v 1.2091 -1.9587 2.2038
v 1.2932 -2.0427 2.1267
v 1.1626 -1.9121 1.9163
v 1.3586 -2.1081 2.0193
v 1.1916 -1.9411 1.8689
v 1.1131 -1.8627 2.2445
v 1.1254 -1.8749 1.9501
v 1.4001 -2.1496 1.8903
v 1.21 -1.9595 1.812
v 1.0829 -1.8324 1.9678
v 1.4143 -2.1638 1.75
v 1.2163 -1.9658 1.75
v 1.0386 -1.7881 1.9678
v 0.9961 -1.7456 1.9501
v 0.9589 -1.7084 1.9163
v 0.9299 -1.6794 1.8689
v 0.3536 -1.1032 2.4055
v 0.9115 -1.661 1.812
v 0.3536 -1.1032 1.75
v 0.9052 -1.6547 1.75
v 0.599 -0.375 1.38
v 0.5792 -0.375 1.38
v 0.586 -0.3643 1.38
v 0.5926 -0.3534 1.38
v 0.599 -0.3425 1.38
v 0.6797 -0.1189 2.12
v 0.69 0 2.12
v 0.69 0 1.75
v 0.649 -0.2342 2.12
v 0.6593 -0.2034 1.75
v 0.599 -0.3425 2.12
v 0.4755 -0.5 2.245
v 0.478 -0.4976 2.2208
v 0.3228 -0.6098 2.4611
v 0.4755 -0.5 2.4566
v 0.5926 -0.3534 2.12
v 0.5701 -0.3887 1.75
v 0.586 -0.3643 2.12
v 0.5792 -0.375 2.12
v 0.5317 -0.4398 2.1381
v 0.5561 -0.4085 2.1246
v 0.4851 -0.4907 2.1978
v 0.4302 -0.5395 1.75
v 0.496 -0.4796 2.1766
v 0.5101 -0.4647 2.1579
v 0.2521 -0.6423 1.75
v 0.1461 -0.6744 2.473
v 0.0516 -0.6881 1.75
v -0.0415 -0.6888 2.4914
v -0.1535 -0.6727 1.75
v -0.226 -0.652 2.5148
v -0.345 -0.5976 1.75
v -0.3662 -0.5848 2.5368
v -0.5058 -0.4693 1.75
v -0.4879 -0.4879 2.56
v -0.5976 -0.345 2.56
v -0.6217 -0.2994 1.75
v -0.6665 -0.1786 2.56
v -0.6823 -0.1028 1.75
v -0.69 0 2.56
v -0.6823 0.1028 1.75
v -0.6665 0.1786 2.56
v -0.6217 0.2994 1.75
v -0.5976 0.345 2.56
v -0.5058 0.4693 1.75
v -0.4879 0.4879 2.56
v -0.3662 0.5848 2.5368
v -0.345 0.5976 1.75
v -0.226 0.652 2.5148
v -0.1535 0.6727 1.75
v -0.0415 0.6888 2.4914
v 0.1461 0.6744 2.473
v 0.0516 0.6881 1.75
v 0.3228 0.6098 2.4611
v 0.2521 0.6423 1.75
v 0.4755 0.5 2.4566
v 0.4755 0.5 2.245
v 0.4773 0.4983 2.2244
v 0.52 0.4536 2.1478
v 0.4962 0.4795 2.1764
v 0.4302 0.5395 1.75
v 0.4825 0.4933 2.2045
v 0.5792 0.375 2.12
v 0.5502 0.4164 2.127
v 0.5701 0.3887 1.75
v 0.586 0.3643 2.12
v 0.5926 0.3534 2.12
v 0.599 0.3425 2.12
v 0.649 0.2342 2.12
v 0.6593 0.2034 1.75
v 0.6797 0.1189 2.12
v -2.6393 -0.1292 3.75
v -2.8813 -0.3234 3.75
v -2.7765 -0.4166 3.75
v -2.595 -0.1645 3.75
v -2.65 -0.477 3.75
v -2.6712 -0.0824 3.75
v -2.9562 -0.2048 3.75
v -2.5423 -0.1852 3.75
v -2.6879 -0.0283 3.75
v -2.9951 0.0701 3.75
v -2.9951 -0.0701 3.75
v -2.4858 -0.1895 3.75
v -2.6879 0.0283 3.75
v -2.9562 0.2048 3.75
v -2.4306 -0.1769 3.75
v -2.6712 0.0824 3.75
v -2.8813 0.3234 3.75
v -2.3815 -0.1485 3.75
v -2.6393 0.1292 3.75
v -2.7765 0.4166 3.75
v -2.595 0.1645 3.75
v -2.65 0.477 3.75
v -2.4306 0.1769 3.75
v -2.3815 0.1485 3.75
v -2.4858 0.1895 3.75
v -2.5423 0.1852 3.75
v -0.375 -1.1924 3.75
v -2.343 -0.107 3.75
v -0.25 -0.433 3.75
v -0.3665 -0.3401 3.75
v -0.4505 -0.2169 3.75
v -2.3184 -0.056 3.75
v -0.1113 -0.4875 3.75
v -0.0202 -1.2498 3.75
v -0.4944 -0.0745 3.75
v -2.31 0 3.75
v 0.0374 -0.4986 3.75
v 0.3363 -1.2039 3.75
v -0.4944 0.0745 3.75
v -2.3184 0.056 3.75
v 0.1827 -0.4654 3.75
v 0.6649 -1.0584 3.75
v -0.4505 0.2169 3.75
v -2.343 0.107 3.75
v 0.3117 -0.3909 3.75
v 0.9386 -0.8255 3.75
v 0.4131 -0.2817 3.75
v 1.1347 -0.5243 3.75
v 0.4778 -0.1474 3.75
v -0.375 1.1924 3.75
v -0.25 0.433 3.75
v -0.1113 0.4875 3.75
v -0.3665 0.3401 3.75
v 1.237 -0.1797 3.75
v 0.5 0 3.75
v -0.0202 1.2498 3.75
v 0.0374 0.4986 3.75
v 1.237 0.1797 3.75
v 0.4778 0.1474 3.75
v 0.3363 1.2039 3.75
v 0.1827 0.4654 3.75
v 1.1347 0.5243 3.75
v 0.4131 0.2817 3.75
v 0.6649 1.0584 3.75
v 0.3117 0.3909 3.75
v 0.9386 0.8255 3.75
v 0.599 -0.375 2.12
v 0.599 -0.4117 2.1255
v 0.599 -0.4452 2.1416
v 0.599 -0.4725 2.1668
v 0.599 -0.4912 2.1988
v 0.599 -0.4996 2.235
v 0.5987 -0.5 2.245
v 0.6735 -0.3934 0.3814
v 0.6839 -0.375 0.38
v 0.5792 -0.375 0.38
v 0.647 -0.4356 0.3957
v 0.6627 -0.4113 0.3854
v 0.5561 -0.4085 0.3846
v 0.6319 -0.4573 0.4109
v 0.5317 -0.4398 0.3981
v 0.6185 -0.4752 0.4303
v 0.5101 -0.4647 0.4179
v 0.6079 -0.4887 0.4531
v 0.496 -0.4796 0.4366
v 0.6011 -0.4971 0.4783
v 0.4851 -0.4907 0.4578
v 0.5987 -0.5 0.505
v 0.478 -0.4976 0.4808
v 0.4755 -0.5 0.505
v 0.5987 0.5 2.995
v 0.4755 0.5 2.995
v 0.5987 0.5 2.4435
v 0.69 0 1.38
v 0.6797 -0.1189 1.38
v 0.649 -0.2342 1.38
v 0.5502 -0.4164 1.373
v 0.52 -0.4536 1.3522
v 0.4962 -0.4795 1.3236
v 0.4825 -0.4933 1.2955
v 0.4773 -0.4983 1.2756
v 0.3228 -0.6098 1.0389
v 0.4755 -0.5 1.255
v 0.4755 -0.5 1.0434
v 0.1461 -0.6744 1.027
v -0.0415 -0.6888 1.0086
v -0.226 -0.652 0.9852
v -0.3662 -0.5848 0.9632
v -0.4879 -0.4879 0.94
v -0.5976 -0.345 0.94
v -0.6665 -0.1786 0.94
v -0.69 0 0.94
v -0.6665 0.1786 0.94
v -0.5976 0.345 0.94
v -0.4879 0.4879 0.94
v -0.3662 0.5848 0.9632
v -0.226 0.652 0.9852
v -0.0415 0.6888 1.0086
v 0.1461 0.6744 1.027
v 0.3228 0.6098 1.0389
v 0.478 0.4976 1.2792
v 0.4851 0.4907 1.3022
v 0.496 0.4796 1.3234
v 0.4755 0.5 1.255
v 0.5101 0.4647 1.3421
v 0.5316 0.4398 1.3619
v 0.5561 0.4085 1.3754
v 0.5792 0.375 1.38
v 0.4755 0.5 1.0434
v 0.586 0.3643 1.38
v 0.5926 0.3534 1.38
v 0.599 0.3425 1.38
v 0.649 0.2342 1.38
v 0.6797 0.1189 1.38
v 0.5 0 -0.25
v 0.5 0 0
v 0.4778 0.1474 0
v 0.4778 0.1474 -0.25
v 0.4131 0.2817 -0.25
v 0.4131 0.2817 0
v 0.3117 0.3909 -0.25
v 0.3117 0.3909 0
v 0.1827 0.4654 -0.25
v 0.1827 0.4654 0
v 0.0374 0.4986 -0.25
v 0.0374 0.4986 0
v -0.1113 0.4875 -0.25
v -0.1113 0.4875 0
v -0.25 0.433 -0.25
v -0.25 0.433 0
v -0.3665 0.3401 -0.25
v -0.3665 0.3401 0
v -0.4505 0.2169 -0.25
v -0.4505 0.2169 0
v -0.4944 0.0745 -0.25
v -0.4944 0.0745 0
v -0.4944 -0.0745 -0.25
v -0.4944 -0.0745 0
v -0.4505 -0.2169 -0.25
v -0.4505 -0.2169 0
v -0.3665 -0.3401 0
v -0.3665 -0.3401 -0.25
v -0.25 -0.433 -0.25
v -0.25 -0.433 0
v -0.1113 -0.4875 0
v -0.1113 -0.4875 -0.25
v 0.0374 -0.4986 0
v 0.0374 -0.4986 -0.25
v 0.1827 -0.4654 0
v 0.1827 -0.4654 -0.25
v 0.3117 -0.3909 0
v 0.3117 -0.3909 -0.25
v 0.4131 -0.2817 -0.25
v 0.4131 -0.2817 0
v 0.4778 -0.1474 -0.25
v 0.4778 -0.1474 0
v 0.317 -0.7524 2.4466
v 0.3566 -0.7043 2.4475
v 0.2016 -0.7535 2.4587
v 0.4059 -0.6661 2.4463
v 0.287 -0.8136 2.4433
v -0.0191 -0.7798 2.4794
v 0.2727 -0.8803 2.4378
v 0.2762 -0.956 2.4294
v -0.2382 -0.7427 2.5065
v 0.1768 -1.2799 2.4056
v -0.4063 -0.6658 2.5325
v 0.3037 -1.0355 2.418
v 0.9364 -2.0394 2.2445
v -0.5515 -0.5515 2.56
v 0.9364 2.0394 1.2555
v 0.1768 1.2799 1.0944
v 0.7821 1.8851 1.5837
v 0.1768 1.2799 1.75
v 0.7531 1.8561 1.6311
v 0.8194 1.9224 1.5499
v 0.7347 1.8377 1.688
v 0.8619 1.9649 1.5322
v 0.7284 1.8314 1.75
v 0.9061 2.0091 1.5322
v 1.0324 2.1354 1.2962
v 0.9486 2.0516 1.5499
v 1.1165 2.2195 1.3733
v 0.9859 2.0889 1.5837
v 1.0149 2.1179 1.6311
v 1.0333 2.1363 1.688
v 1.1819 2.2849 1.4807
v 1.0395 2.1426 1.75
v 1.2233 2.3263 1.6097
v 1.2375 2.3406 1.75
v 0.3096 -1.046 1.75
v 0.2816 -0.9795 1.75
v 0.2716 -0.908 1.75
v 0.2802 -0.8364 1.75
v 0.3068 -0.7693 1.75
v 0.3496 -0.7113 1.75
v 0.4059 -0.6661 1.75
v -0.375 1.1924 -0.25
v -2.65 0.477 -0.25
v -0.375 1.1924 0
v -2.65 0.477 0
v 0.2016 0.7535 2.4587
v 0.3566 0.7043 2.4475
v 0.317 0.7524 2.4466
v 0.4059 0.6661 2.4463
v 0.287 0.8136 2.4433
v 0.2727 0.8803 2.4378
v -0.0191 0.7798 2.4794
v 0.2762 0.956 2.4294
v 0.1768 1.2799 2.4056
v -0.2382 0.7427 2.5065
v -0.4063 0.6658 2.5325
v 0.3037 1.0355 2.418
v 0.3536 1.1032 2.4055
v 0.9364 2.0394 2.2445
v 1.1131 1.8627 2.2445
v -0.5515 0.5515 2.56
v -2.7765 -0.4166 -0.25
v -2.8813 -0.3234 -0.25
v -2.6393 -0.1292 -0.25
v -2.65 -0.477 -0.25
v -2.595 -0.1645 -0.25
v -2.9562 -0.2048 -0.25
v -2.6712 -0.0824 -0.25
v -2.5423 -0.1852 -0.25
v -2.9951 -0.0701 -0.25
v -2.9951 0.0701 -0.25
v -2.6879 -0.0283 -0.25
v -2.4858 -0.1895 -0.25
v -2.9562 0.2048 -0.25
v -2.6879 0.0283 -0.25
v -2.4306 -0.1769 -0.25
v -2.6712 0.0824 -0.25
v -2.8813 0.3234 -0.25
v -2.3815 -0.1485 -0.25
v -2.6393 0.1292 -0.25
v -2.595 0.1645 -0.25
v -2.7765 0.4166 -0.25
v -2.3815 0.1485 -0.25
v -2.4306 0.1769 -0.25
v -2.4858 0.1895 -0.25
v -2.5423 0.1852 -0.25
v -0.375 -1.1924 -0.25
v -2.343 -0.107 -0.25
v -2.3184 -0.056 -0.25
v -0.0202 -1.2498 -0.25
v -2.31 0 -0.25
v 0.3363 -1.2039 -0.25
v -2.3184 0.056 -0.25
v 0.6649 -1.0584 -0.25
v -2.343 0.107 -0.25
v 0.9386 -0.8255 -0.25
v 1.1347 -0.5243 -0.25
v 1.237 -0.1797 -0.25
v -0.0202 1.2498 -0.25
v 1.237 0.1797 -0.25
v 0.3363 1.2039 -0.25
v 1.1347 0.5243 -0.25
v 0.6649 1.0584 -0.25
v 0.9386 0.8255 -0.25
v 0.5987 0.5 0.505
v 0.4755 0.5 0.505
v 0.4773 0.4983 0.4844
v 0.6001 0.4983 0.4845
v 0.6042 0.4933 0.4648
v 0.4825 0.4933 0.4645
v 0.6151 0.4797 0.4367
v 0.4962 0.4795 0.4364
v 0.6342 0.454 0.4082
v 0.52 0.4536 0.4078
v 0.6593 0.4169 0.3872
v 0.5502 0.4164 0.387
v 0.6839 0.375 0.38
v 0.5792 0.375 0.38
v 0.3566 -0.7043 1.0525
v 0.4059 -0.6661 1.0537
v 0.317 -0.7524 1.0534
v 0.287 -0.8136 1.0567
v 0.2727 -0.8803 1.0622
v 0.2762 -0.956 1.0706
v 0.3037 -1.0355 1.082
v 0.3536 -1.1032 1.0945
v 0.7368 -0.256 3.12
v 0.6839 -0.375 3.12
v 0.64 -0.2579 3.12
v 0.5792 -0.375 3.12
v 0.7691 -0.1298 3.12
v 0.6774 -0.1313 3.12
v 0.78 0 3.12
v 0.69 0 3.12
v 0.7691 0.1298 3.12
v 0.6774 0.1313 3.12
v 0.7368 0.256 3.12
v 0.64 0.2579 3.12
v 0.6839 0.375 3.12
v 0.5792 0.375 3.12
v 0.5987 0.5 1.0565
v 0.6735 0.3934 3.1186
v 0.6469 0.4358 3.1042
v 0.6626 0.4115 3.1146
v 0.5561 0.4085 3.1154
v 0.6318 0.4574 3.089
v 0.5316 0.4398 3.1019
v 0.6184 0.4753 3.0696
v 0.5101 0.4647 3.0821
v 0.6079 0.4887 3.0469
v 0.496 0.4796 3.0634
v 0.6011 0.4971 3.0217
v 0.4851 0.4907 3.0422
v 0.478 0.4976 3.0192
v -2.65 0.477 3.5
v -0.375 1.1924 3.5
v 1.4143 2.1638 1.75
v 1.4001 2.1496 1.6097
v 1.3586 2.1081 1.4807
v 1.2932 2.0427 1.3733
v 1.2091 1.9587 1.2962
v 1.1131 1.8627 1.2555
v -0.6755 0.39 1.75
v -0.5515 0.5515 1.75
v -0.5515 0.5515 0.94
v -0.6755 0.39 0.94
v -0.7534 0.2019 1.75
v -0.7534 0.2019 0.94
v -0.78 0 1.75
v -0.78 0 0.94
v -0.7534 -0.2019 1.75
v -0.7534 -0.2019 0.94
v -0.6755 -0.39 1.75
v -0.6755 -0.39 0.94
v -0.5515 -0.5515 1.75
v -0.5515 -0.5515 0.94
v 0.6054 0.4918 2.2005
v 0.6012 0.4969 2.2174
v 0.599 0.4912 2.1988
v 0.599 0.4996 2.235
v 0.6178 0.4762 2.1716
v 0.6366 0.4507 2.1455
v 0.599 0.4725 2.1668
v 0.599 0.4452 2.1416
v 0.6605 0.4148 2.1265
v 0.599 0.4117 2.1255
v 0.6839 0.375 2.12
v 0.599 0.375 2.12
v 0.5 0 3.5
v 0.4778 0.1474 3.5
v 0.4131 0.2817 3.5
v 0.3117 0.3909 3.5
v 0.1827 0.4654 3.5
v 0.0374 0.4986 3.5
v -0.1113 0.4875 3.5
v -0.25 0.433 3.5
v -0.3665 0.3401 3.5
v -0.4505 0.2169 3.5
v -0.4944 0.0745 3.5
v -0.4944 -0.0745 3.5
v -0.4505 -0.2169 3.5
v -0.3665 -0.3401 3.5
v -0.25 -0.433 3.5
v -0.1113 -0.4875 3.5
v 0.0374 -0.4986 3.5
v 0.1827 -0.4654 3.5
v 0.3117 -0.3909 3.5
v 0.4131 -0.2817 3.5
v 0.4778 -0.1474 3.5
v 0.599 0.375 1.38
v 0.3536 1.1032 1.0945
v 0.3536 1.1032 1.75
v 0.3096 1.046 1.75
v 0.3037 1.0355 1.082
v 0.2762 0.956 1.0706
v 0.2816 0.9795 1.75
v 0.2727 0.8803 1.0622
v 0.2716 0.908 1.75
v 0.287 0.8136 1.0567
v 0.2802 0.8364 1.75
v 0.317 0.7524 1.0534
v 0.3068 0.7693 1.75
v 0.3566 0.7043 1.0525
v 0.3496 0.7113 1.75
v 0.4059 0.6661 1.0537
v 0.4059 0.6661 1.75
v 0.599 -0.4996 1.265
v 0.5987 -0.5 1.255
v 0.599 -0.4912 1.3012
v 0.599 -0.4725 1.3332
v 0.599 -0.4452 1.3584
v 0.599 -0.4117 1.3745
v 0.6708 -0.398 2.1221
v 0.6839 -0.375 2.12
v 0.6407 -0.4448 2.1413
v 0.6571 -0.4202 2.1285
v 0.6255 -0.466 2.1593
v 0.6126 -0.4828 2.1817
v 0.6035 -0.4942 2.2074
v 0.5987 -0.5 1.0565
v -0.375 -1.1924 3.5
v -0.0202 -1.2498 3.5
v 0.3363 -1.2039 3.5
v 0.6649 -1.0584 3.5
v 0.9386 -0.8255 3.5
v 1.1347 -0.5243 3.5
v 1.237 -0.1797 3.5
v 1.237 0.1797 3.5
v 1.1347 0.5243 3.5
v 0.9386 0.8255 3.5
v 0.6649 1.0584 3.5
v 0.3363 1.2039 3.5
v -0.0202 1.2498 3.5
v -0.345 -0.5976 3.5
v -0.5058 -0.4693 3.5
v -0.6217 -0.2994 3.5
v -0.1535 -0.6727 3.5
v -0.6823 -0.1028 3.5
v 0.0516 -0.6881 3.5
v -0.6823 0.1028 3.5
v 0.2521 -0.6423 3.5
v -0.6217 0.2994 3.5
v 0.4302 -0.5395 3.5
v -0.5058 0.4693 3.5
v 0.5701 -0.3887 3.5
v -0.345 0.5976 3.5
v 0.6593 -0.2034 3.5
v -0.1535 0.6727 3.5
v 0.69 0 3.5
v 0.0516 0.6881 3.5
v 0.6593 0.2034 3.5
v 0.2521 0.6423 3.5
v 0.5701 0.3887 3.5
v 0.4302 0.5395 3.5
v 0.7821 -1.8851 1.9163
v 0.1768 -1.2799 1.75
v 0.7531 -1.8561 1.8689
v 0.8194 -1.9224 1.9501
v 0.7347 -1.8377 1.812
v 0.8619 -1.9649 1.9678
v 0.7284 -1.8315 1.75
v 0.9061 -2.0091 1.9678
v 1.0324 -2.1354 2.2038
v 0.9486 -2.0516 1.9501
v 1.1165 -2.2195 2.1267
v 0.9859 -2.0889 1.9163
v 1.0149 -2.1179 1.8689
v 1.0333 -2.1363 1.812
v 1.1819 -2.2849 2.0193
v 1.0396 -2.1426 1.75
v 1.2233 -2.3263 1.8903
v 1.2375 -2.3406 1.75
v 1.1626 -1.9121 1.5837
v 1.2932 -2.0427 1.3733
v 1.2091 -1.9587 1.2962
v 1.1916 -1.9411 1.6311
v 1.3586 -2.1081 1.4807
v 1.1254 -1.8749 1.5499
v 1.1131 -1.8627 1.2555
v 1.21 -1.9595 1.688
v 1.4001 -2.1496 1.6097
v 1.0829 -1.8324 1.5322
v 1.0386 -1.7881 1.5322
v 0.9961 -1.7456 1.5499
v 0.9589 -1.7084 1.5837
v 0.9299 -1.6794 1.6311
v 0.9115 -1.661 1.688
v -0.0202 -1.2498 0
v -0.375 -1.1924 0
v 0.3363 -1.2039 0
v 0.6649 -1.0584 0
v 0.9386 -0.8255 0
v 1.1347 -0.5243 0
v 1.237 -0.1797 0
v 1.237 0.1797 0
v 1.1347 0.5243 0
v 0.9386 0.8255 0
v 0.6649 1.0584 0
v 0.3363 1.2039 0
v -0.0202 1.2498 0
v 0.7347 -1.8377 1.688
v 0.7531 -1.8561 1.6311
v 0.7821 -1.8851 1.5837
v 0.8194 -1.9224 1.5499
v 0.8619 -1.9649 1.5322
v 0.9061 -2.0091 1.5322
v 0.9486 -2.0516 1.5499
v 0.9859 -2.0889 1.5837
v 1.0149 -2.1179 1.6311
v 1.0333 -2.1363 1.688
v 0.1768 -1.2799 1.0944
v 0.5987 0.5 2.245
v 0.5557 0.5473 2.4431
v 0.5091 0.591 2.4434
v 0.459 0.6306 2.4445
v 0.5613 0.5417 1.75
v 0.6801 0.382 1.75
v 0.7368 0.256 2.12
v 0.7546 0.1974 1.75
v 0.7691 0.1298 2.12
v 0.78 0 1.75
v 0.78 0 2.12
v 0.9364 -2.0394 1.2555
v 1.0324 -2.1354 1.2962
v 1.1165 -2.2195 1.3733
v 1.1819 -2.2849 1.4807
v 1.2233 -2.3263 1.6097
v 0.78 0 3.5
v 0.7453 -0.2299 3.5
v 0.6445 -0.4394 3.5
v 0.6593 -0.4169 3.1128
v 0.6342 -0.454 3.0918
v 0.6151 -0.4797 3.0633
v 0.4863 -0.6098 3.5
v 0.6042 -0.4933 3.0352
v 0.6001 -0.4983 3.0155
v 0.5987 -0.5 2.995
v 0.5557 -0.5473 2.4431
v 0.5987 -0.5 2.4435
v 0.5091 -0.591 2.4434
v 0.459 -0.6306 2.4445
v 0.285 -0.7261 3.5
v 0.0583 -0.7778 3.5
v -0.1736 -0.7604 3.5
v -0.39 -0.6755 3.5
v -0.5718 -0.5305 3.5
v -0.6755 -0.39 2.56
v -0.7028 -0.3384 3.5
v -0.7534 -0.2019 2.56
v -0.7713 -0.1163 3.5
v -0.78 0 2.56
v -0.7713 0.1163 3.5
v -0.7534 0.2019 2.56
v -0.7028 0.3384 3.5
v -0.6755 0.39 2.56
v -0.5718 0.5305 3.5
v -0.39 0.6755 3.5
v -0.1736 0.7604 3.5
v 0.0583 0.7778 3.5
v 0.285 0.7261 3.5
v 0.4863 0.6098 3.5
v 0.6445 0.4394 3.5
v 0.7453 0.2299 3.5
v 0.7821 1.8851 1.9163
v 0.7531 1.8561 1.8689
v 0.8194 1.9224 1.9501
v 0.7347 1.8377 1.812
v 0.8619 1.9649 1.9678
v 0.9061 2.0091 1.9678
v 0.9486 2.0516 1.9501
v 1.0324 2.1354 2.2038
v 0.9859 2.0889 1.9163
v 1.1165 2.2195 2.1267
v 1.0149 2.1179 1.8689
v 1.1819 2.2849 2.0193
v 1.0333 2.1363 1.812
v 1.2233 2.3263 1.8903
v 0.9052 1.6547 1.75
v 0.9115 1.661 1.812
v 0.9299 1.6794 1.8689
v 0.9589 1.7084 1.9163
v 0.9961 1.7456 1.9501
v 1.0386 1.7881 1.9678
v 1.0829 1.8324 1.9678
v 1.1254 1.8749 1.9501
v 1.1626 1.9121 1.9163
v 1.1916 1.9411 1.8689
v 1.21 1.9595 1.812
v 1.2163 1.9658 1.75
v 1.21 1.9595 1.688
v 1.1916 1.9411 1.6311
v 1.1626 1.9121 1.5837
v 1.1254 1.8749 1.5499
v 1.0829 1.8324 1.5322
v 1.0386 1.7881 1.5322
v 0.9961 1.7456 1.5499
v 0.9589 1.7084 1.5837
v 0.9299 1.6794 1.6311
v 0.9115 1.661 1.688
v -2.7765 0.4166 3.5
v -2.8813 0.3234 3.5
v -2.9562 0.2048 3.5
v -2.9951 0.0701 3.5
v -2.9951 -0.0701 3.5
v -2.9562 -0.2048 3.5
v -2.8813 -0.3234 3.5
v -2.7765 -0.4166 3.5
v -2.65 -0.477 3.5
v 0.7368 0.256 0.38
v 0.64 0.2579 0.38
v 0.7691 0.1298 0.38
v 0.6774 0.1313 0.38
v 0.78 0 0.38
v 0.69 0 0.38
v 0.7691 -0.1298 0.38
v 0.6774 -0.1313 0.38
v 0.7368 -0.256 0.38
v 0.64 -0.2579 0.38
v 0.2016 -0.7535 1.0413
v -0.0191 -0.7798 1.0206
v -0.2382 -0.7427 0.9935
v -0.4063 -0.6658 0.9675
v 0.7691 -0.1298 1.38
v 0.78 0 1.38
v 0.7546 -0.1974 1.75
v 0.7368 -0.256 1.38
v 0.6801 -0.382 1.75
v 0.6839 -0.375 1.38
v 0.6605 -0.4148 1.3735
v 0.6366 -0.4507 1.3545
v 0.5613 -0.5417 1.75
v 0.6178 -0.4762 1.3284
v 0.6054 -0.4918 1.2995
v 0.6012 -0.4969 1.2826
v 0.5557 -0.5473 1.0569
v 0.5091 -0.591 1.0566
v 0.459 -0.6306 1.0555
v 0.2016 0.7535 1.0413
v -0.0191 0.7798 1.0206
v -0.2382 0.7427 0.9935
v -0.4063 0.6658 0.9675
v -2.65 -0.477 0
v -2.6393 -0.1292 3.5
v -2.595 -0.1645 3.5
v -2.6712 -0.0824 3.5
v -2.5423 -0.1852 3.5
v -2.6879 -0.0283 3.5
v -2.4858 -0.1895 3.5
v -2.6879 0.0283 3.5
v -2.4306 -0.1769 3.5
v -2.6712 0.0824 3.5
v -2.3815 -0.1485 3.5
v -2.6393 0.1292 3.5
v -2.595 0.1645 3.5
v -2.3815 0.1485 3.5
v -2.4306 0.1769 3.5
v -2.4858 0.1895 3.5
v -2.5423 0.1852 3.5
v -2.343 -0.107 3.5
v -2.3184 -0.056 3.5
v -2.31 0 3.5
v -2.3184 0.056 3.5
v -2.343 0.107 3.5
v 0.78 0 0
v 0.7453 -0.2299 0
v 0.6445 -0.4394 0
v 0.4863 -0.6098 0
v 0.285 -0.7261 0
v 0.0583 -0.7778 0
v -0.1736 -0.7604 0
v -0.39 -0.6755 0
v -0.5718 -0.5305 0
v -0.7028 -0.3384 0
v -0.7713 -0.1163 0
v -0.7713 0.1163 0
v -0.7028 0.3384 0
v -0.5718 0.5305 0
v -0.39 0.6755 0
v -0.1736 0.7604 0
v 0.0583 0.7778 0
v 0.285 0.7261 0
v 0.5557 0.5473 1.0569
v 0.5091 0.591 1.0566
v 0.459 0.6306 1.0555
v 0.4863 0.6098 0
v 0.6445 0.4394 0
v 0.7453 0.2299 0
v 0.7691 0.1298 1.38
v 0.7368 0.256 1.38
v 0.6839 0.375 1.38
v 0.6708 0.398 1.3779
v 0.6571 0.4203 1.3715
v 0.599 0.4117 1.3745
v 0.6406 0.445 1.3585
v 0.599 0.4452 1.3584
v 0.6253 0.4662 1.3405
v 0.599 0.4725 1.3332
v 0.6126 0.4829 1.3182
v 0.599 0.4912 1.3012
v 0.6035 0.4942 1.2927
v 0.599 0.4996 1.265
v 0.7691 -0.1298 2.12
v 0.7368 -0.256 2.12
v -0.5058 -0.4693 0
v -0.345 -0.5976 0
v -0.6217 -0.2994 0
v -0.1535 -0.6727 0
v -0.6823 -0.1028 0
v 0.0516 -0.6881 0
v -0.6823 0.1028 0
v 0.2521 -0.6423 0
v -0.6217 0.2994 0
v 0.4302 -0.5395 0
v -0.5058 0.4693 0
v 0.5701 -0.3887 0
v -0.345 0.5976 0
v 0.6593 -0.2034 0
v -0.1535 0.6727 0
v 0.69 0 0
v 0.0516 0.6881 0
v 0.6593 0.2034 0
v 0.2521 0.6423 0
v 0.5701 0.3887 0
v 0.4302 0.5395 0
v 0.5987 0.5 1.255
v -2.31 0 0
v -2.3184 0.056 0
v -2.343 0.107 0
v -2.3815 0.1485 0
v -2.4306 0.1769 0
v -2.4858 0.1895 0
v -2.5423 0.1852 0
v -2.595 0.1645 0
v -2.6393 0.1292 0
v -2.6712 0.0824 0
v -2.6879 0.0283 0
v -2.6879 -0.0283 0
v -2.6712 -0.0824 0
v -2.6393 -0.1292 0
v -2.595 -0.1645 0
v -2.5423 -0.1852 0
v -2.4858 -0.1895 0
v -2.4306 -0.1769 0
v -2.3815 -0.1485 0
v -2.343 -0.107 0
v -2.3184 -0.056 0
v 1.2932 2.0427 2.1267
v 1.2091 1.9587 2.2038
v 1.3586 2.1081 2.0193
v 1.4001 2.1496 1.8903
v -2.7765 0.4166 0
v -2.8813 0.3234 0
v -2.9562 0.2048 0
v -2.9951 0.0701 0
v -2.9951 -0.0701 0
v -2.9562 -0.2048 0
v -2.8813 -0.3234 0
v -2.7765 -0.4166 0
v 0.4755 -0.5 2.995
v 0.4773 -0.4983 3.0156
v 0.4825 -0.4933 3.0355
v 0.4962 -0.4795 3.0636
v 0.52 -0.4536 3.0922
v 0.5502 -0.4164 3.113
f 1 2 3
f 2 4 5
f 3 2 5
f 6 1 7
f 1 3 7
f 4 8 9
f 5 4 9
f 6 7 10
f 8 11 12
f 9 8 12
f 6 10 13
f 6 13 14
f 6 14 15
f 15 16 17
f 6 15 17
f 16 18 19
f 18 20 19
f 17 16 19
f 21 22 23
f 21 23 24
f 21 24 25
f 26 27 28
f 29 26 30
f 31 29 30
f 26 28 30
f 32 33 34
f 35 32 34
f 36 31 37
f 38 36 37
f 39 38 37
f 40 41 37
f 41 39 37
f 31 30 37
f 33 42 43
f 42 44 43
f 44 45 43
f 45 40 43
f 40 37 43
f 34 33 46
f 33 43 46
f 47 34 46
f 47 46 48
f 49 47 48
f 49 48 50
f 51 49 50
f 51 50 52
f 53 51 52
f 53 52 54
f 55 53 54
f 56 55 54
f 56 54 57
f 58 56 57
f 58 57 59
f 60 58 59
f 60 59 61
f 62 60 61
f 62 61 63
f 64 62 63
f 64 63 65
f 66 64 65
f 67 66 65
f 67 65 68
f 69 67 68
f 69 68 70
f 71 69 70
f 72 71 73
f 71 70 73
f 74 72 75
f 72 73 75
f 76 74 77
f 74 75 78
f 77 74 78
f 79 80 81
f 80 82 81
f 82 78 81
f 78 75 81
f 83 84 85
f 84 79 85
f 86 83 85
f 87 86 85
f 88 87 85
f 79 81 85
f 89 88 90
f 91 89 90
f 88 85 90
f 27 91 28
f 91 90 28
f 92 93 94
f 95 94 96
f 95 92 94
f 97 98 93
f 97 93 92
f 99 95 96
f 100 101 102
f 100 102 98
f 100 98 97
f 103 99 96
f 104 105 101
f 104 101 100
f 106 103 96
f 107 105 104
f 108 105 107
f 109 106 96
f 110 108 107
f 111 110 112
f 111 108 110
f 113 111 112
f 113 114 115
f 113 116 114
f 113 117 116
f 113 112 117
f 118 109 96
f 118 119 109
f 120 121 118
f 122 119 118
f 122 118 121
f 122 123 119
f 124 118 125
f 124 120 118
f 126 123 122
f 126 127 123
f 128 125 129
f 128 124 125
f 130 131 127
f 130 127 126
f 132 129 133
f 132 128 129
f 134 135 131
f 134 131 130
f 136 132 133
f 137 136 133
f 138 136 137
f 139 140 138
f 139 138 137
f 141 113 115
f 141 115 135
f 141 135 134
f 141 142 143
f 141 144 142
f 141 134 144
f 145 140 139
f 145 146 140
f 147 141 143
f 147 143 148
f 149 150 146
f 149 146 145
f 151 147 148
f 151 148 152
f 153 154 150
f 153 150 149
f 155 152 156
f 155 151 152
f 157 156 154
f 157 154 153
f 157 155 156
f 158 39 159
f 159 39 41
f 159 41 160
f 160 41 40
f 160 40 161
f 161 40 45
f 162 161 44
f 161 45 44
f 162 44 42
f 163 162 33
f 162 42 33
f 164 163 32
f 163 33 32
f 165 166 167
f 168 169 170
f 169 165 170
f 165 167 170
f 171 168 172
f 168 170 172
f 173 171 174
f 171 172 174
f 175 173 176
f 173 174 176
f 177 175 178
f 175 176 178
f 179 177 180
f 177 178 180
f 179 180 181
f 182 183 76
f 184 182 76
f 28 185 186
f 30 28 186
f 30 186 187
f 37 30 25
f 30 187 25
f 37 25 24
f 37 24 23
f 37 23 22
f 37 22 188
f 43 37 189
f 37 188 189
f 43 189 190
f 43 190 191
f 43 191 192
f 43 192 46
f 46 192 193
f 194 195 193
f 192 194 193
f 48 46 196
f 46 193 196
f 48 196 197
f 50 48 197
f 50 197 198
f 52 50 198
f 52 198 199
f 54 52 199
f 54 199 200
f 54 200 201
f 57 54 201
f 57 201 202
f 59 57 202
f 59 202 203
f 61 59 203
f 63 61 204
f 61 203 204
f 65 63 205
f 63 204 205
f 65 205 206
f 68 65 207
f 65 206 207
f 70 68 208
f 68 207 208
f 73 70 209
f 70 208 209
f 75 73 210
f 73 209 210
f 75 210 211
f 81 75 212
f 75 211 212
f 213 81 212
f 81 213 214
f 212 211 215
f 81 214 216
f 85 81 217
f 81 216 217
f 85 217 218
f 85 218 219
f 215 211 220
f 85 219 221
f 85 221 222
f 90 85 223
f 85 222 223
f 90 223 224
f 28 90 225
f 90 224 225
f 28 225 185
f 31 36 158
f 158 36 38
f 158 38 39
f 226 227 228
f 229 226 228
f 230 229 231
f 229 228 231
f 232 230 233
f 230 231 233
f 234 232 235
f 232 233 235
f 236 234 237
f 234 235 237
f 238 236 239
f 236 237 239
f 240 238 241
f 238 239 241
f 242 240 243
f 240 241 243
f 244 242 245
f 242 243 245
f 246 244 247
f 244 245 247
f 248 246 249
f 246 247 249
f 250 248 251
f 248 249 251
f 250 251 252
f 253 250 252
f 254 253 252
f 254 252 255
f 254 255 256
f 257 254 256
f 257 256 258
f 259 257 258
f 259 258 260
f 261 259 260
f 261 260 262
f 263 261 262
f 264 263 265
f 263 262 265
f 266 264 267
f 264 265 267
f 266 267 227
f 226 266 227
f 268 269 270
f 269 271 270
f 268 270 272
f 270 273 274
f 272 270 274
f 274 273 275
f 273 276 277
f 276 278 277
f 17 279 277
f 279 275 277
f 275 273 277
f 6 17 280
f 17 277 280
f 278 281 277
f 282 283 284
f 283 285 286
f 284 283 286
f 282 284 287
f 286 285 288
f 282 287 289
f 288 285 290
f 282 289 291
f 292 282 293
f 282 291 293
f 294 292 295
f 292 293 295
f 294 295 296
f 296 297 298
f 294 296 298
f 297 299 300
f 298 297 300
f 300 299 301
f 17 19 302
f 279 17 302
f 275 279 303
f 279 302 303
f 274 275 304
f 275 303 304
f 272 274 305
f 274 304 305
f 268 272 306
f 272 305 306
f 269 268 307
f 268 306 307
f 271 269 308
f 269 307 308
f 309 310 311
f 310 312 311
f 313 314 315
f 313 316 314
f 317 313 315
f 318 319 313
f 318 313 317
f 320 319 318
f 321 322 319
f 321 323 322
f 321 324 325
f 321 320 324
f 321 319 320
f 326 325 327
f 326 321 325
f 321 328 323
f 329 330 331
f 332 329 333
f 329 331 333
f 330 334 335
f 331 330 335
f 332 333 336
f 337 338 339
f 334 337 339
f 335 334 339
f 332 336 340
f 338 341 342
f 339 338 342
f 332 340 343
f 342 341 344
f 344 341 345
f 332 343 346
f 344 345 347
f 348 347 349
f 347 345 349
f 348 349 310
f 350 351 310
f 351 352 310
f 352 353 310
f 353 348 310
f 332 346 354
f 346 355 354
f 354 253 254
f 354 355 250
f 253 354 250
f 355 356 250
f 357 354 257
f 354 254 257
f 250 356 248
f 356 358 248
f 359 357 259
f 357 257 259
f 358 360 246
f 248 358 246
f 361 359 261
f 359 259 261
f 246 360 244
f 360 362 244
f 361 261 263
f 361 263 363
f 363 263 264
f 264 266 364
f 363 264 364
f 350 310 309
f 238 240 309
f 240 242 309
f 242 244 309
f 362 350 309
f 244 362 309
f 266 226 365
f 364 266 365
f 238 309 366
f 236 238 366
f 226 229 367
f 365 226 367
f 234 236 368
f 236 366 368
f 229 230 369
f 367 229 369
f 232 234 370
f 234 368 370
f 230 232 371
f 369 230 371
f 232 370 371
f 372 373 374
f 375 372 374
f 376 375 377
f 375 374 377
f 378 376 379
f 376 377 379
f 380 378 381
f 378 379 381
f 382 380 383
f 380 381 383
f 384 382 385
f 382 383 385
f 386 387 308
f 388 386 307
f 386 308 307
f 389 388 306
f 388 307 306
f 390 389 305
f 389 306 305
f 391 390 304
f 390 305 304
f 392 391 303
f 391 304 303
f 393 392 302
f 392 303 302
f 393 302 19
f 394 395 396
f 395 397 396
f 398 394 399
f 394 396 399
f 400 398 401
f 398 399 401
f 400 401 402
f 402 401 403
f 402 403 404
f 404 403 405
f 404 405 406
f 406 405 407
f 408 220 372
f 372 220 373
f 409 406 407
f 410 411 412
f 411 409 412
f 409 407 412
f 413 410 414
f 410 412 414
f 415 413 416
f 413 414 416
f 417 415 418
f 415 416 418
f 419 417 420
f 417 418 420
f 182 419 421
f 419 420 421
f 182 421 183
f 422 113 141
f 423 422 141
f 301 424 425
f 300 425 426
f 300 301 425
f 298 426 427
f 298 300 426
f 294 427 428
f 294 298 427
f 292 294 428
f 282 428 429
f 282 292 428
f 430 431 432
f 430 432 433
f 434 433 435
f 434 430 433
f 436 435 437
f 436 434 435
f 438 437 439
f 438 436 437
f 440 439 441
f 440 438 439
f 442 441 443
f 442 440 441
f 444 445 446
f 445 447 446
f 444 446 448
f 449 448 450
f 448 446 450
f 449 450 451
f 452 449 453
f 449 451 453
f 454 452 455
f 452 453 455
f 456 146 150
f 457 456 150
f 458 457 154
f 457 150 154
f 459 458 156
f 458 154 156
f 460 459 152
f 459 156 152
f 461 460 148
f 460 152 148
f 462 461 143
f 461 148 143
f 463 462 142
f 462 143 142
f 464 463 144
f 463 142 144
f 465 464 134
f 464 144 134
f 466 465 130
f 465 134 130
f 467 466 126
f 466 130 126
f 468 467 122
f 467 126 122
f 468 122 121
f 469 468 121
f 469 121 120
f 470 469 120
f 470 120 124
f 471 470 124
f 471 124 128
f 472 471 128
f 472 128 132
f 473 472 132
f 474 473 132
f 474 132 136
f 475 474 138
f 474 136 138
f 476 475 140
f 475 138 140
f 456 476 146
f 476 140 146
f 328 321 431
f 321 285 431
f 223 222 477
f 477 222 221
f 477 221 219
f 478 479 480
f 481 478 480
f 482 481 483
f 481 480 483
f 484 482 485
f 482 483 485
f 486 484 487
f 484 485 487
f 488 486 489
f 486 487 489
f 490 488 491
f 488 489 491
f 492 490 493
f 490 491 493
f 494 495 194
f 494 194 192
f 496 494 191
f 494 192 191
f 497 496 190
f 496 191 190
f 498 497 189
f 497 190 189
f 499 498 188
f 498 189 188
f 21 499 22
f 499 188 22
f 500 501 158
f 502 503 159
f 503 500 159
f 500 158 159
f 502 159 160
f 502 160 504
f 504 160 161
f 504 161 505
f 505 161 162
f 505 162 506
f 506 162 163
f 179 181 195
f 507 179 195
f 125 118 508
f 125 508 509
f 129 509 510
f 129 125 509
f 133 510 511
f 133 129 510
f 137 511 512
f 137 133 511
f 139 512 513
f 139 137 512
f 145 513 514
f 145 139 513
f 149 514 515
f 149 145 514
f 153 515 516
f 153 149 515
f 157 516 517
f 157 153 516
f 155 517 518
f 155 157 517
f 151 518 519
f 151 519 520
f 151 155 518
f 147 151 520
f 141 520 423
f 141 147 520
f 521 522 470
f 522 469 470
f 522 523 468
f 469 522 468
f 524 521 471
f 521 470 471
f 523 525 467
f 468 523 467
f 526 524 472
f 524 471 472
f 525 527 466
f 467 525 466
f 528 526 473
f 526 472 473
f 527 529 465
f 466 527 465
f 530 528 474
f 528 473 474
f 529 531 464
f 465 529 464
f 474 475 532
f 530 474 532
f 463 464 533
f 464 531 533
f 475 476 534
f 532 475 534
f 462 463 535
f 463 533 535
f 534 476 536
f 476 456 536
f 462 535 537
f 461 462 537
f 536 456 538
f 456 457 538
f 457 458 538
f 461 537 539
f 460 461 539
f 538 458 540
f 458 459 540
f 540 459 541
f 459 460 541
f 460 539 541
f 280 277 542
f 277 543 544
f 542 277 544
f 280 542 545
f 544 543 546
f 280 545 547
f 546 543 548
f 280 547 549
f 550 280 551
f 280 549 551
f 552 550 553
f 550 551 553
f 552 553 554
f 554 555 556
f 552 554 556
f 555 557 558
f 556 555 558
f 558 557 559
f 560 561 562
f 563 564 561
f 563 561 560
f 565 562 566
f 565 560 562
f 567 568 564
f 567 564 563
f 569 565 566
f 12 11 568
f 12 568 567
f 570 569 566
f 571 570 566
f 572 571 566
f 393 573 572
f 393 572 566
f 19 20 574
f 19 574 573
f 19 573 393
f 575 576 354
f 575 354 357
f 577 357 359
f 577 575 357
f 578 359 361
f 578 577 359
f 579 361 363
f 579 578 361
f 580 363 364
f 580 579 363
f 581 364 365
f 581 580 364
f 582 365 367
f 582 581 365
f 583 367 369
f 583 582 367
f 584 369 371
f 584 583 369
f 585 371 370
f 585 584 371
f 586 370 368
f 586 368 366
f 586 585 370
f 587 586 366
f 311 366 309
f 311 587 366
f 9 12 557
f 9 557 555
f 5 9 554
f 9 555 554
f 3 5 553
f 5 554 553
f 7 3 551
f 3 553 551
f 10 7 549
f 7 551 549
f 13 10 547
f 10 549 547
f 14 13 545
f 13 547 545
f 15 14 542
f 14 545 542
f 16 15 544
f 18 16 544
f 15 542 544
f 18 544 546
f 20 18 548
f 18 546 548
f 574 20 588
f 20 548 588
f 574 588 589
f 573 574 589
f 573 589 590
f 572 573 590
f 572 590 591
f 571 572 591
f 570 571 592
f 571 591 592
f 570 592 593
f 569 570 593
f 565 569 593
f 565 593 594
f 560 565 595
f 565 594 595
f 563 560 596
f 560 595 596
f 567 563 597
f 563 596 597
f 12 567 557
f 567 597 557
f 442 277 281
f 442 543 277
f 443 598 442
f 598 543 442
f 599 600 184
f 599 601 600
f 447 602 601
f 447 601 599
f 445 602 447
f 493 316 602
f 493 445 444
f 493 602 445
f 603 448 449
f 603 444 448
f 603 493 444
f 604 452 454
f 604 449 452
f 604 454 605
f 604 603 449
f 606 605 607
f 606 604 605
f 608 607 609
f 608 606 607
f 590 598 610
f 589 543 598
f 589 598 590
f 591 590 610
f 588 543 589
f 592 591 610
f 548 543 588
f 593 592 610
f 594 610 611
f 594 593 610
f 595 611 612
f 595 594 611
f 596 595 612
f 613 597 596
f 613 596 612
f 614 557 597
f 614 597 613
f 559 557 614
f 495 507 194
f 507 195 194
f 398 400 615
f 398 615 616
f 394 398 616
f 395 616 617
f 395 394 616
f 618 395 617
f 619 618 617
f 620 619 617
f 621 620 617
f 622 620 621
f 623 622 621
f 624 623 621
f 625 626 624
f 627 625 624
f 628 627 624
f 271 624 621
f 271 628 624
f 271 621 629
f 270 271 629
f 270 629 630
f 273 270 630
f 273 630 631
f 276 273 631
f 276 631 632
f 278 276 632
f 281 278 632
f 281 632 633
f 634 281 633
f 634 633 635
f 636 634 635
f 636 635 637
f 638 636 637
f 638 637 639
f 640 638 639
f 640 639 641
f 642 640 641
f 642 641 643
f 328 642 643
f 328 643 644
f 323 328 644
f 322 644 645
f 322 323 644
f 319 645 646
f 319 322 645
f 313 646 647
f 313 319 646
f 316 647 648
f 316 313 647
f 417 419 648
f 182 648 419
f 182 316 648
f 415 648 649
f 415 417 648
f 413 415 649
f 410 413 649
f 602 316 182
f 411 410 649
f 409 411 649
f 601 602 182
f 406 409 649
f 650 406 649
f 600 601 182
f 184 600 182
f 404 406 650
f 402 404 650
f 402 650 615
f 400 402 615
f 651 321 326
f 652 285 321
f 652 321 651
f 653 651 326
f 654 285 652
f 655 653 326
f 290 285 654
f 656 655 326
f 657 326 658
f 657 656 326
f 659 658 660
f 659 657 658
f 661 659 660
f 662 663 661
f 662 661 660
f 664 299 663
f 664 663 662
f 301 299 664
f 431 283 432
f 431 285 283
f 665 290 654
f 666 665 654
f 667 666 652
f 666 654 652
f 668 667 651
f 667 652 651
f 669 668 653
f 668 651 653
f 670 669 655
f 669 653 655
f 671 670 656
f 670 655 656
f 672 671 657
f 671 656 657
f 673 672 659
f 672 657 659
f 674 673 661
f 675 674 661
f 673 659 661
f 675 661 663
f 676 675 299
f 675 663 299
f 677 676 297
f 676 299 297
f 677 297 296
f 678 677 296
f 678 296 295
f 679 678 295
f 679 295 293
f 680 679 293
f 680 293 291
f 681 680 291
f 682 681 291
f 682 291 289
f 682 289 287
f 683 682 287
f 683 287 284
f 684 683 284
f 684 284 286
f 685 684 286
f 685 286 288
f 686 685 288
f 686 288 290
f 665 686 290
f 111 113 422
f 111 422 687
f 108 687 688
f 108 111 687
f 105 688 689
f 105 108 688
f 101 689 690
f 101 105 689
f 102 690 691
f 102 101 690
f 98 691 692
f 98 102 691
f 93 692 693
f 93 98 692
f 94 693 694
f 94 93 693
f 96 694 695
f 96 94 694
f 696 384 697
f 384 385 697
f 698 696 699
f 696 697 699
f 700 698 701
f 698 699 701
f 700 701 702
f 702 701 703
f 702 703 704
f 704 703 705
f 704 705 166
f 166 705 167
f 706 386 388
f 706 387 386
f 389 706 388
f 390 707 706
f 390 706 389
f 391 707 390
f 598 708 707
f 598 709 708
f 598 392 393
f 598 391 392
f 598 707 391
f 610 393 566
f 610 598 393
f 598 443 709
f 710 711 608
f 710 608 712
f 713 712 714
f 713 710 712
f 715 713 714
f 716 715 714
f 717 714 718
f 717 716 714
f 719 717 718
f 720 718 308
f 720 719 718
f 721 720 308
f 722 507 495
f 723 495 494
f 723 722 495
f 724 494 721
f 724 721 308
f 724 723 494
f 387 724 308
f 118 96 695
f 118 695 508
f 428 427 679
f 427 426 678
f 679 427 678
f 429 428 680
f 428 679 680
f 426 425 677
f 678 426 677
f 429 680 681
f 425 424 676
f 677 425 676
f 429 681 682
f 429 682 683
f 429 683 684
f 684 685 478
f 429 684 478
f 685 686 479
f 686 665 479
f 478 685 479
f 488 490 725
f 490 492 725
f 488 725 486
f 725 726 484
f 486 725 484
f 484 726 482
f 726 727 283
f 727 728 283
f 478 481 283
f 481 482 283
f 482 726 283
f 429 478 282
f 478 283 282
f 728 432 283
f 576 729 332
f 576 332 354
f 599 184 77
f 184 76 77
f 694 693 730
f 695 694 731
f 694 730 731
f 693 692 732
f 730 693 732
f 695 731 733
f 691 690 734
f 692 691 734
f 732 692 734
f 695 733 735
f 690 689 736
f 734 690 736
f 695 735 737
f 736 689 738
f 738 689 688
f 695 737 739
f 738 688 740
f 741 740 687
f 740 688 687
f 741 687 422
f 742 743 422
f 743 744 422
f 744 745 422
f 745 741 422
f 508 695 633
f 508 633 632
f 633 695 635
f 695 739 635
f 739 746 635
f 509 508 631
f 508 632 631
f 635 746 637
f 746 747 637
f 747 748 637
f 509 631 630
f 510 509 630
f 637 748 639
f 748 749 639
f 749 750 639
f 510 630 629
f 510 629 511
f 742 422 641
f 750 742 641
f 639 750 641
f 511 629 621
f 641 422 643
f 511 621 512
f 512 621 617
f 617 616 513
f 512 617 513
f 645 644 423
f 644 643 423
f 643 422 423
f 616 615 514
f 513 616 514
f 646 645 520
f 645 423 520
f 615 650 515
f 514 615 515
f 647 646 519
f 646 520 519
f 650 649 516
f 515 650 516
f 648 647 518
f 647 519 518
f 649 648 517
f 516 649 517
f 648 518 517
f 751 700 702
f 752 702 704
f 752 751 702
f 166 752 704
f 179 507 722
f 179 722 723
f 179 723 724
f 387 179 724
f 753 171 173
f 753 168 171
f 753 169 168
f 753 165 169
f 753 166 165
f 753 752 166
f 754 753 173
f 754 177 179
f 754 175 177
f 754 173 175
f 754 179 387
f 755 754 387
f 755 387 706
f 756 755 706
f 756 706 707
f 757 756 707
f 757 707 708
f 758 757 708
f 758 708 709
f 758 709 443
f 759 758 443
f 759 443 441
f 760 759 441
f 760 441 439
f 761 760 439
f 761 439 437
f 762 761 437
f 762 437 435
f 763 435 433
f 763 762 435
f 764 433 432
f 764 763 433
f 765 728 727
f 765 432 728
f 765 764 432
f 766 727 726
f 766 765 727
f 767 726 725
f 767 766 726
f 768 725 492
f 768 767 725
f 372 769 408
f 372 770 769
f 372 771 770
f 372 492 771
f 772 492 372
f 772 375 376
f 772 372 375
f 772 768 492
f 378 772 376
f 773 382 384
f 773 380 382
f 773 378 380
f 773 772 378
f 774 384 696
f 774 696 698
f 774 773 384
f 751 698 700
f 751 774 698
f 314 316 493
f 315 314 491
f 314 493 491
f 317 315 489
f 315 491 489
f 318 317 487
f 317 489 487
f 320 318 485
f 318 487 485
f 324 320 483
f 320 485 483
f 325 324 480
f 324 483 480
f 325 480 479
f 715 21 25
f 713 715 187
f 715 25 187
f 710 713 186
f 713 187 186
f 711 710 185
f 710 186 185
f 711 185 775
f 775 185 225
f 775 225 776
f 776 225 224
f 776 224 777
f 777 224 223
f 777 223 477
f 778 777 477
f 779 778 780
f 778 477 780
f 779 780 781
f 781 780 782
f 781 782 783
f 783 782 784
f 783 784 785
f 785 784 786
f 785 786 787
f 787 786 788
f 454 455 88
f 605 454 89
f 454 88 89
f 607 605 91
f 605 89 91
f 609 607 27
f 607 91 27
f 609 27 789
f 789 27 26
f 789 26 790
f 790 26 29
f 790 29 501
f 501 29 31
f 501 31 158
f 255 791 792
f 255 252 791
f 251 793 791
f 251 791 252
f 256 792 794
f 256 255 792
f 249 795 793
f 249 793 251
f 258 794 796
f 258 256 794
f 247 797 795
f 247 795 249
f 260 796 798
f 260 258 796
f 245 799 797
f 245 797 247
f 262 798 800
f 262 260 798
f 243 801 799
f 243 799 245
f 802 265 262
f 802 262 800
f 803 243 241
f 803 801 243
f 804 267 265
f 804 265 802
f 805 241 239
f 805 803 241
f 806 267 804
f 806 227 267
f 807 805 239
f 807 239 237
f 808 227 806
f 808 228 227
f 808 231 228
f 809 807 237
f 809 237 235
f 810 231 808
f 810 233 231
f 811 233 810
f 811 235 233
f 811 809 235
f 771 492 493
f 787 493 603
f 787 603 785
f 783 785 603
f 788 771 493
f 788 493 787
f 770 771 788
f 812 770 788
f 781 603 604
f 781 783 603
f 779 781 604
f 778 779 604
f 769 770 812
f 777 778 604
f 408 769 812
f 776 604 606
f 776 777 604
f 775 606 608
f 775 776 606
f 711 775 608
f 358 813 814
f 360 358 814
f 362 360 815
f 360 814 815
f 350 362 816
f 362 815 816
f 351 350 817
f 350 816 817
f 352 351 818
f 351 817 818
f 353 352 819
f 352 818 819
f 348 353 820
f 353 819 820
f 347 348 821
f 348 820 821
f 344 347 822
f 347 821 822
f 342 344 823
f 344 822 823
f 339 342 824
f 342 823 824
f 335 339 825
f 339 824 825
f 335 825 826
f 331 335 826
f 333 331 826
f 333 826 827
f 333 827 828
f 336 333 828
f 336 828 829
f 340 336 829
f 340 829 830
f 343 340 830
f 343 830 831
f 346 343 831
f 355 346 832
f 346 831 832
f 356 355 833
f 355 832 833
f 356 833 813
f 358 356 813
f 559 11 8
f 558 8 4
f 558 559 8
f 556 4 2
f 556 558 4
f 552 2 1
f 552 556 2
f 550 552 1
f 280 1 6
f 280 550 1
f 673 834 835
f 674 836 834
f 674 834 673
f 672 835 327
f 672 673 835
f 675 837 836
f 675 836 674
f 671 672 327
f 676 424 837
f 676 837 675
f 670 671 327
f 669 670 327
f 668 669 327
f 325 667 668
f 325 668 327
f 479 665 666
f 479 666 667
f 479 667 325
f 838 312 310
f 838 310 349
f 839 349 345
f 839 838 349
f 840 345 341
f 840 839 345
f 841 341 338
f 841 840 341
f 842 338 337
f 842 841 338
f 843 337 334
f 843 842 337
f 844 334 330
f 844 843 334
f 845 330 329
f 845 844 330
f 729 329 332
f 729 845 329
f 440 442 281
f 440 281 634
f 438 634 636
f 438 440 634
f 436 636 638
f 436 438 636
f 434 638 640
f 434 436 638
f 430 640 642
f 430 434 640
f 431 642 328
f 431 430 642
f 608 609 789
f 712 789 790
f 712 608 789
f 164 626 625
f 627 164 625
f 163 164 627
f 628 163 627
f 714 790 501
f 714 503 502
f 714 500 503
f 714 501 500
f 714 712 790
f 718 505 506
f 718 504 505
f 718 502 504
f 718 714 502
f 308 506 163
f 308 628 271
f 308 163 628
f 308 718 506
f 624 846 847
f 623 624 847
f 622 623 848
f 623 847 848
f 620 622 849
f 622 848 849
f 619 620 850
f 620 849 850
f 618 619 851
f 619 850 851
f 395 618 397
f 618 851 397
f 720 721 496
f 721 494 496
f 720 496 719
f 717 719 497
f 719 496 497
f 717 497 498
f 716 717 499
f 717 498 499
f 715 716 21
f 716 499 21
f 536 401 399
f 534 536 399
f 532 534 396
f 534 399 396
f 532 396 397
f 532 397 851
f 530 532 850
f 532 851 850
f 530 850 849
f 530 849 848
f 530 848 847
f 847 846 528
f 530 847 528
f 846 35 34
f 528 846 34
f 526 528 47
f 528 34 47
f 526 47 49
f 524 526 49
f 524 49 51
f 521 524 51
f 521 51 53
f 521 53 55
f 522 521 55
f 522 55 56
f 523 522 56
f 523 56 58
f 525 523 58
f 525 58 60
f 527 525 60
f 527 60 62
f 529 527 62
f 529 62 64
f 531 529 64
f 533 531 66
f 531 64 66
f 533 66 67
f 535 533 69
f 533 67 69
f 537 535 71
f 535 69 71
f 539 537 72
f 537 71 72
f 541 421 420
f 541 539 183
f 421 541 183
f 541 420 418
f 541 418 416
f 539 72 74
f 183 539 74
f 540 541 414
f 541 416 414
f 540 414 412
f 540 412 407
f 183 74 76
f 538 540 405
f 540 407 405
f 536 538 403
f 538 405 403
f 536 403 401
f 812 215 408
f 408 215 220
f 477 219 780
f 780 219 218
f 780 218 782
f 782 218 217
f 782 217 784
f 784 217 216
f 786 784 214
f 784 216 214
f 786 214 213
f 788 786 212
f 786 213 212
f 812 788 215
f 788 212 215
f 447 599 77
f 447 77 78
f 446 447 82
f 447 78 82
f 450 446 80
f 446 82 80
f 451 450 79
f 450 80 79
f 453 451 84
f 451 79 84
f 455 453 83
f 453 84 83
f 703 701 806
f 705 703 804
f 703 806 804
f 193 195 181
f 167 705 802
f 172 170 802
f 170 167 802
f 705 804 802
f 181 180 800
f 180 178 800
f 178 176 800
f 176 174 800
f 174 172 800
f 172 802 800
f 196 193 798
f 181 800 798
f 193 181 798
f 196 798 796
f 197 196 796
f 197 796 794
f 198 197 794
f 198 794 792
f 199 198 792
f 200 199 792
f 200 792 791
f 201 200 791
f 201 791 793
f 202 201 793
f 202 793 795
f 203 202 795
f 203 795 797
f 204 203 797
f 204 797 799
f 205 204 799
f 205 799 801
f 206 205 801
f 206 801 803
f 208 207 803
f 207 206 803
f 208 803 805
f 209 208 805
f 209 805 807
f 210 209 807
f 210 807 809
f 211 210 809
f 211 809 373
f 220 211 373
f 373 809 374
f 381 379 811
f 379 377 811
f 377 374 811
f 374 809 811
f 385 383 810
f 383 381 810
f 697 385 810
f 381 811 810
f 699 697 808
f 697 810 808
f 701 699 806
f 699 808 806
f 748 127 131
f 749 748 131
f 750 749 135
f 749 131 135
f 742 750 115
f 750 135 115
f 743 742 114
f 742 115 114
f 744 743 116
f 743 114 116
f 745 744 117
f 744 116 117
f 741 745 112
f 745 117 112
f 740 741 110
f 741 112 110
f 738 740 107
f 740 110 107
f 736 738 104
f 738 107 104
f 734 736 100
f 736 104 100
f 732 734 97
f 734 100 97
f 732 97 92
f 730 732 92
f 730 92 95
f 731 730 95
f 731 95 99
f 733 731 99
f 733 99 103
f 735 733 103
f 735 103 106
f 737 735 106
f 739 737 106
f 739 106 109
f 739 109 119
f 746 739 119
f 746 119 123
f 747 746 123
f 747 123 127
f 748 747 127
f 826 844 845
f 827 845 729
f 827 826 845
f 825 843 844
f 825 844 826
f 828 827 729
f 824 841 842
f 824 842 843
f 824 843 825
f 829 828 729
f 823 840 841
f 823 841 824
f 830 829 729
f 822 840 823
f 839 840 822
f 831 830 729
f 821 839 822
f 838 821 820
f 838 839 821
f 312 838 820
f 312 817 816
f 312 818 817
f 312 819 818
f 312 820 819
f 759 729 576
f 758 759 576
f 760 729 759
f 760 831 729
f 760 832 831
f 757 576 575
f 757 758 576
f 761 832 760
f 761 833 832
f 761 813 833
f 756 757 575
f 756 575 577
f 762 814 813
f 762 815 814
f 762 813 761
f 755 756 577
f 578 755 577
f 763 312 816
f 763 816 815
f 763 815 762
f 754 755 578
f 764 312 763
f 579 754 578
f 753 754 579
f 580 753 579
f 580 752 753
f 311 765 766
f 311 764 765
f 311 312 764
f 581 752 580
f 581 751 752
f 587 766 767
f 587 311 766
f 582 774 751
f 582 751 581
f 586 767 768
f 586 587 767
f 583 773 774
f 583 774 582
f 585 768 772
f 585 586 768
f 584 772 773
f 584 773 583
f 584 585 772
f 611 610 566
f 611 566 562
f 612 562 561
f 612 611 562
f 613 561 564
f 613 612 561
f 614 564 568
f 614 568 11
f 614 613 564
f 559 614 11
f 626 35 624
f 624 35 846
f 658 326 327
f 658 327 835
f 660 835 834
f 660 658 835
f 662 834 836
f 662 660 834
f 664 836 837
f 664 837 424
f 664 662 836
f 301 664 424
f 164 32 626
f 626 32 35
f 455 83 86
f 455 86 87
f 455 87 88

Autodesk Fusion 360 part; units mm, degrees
sketch "草图1" plane through (0, 0, 0) normal (0, 0, 1) x (1, 0, 0)
  circle A0 centre (0, 0) radius 0.69
  circle A1 centre (0, 0) radius 0.78
  circle A2 centre (0, 0) radius 0.5
  circle A3 centre (-2.5, 0) radius 0.19
  line L0 (-2.65, 0.477) -> (-0.375, 1.1924)
  line L1 (-2.65, -0.477) -> (-0.375, -1.1924)
  arc A4 (-2.65, 0.477) -> (-2.65, -0.477) centre (-2.5, 0) ccw
  line L2 (-2.5, 0) -> (-2.31, 0)
  arc A5 (-0.375, -1.1924) -> (-0.375, 1.1924) centre (0, 0) ccw
  dimension "d1" = 1.38
  dimension "d2" = 1.56
  dimension "d3" = 1
  dimension "d4" = 2.5
  dimension "d5" = 0.38
  dimension "d6" = 1
  dimension "d7" = 2.5
extrude "拉伸1" add sketch "草图1" against normal blind 0.25 contours A0 | A1 | L0 L1 A4 A5 makes body 1
extrude "拉伸2" add sketch "草图1" along normal blind 3.5 separate body contours A1 makes body 2
copy_body "复制和粘贴实体1" bodies 1 makes body 3
move_body "移动1" bodies 3 to x (1, 0, 0) y (0, 1, 0) z (0, 0, 1) at (0, 0, 3.75)
sketch "草图2" plane through (0, 0, 0) normal (1, 0, 0) x (0, 1, 0)
  line L0 (-0.375, 3.12) -> (0.375, 3.12)
  line L1 (0.5, 2.995) -> (0.5, 2.245)
  line L2 (0.375, 2.12) -> (-0.375, 2.12)
  line L3 (-0.5, 2.245) -> (-0.5, 2.995)
  line L4 (-0.375, 1.38) -> (0.375, 1.38)
  line L5 (0.5, 1.255) -> (0.5, 0.505)
  line L6 (0.375, 0.38) -> (-0.375, 0.38)
  line L7 (-0.5, 0.505) -> (-0.5, 1.255)
  arc A0 (-0.375, 3.12) -> (-0.5, 2.995) centre (-0.375, 2.995) ccw
  arc A1 (0.5, 2.995) -> (0.375, 3.12) centre (0.375, 2.995) ccw
  arc A2 (0.375, 0.38) -> (0.5, 0.505) centre (0.375, 0.505) ccw
  arc A3 (-0.5, 0.505) -> (-0.375, 0.38) centre (-0.375, 0.505) ccw
  arc A4 (-0.375, 1.38) -> (-0.5, 1.255) centre (-0.375, 1.255) ccw
  arc A5 (0.5, 1.255) -> (0.375, 1.38) centre (0.375, 1.255) ccw
  arc A6 (0.375, 2.12) -> (0.5, 2.245) centre (0.375, 2.245) ccw
  arc A7 (-0.5, 2.245) -> (-0.375, 2.12) centre (-0.375, 2.245) ccw
  line L8 (0, 4) -> (0, -0.5512) construction
  dimension "d12" = 0.125
  dimension "d13" = 1
  dimension "d14" = 2.74
  dimension "d15" = 0.38
extrude "拉伸3" cut sketch "草图2" along normal blind 0.78 contours L0 L1 L2 L3 A0 A1 A6 A7 bodies 2
extrude "拉伸4" cut sketch "草图2" along normal blind 0.78 contours L4 L5 L6 L7 A2 A3 A4 A5 bodies 2
ref_plane "工作平面1" through (0, 0, 1.75) normal (0, 0, 1) x (1, 0, 0)
sketch "草图3" plane through (0, 0, 1.75) normal (0, 0, 1) x (1, 0, 0)
  circle A0 centre (0, 0) radius 0.78
  circle A1 centre (0, 0) radius 0.69
  line L0 (2.6, 0) -> (-1.7605, 0) construction
  line L1 (1.2375, 2.3406) -> (1.4143, 2.1638)
  line L2 (1.4143, 2.1638) -> (0.3536, 1.1032)
  line L3 (0.3536, 1.1032) -> (0.1768, 1.2799)
  line L4 (0.1768, 1.2799) -> (1.2375, 2.3406)
  line L5 (0.3536, -1.1032) -> (0.1768, -1.2799)
  line L6 (0.1768, -1.2799) -> (1.2375, -2.3406)
  line L7 (1.2375, -2.3406) -> (1.4143, -2.1638)
  line L8 (1.4143, -2.1638) -> (0.3536, -1.1032)
  arc A2 (0.3536, 1.1032) -> (0.4059, 0.6661) centre (0.5516, 0.9052) ccw
  arc A3 (0.4059, -0.6661) -> (0.3536, -1.1032) centre (0.5516, -0.9052) ccw
  line L9 (0.1768, 1.2799) -> (-0.5515, 0.5515)
  line L10 (0.1768, -1.2799) -> (-0.5515, -0.5515)
  dimension "d21" = 1.56
  dimension "d22" = 1.38
  dimension "d23" = 0.25
  dimension "d24" = 45
  dimension "d25" = 1.5
  dimension "d26" = 0.28
extrude "拉伸5" add sketch "草图3" along normal mid plane 1.62 separate body makes body 4
sketch "草图4" plane through (-0.5515, -0.5515, 0) normal (-0.7071, -0.7071, 0) x (0.7071, -0.7071, 0)
  line L0 (2.5301, 0.94) -> (2.5301, 2.56)
  line L1 (2.5301, 2.56) -> (0, 2.56)
  line L2 (0, 2.56) -> (0, 0.94)
  line L3 (0, 0.94) -> (2.5301, 0.94)
  circle A0 centre (2.0301, 1.75) radius 0.22
  circle A1 centre (2.0301, 1.75) radius 0.5
  line L4 (0, 2.56) -> (2.1042, 2.2445)
  line L5 (0, 0.94) -> (2.1042, 1.2555)
  line L6 (0, 2.56) -> (0, 0.94)
  dimension "d29" = 1
  dimension "d30" = 0.44
  dimension "d31" = 0.81
extrude "拉伸6" cut sketch "草图4" against normal blind 1.2 contours L0 L3 A1 L5 | L0 L1 A1 L4 | A0 bodies 4
sketch "草图5" plane through (-0.5515, 0.5515, 0) normal (-0.7071, 0.7071, 0) x (-0.7071, -0.7071, 0)
  line L0 (0, 0.94) -> (0, 2.56)
  line L1 (0, 2.56) -> (-2.5301, 2.56)
  line L2 (-2.5301, 2.56) -> (-2.5301, 0.94)
  line L3 (-2.5301, 0.94) -> (0, 0.94)
  circle A0 centre (-2.0301, 1.75) radius 0.5
  circle A1 centre (-2.0301, 1.75) radius 0.22
  line L4 (0, 2.56) -> (0, 0.94)
  line L5 (0, 0.94) -> (-2.1042, 1.2555)
  line L6 (0, 2.56) -> (-2.1042, 2.2445)
  dimension "d34" = 1
  dimension "d35" = 0.44
  dimension "d36" = 0.81
extrude "拉伸7" cut sketch "草图5" against normal blind 2.6 contours L2 L3 A0 L5 | L1 L2 A0 L6 | A1 bodies 4
extrude "拉伸8" cut sketch "草图2" along normal blind 0.599 bodies 4
extrude "拉伸9" cut sketch "草图2" along normal blind 5.4 bodies 4
combine "合并1" operation add target body 1 tool bodies 2 3 4
equation "d14 = 3.5 mm - 0.38 mm - 0.38 mm"
